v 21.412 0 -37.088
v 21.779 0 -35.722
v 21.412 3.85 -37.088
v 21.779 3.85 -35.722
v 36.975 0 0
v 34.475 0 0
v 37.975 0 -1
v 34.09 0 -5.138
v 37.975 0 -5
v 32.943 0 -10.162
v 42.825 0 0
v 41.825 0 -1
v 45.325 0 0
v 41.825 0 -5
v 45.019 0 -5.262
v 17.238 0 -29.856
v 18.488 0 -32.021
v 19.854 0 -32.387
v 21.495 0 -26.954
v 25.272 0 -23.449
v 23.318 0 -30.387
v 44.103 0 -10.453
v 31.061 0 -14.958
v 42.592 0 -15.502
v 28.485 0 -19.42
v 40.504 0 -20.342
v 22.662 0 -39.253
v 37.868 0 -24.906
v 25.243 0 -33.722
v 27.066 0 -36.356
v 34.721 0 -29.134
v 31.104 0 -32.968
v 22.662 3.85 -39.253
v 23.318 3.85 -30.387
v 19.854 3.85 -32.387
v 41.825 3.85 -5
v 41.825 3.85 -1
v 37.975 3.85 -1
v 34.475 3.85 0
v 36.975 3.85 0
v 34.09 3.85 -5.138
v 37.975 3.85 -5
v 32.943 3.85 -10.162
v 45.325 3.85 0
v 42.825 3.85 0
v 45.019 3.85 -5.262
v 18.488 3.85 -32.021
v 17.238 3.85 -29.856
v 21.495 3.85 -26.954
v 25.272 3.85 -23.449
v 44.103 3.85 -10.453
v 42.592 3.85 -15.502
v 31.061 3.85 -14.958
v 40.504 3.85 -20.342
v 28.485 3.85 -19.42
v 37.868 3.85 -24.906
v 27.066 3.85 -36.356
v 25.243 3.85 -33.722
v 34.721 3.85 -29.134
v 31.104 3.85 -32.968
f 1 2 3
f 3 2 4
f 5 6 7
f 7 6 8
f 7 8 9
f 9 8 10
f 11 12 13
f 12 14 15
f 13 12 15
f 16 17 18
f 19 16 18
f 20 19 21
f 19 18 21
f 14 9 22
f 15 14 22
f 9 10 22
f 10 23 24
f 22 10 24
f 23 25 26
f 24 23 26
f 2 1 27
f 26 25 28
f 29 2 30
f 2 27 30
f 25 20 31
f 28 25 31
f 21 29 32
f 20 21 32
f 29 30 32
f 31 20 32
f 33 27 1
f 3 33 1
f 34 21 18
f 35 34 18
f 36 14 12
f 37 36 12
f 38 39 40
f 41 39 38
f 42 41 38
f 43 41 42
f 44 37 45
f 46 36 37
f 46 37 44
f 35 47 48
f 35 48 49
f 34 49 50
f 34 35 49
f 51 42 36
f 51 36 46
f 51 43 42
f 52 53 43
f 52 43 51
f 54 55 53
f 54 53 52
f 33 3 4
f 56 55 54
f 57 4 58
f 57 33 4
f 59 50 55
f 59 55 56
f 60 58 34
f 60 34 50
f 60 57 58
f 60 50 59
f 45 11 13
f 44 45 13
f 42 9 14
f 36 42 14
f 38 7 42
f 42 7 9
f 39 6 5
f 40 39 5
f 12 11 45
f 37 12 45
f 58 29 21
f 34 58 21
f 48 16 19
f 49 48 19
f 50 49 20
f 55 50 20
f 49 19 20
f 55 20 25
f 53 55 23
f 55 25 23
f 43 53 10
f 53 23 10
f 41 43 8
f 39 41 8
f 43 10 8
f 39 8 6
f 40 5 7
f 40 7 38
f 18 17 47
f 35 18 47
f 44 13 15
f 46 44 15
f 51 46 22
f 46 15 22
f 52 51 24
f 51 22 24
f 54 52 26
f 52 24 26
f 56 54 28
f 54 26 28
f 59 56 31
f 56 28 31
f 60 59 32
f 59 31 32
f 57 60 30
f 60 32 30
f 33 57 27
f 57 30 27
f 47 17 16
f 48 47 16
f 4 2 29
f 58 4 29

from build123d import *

# Parameters (mm, degrees)
BOSS_EXTRUDE1_DEPTH = 3.85
CHAMFER1_SIZE       = 1


with BuildPart() as part:
    # Sketch1 → Boss-Extrude1 (new body)
    with BuildSketch(Plane(origin=(0, 0, 0), x_dir=(1, 0, 0), z_dir=(0, 1, 0))):
        with BuildLine():
            Line((37.975, 0), (37.975, 5))
            Line((37.975, 5), (41.825, 5))
            Line((41.825, 5), (41.825, 0))
            Line((41.825, 0), (45.325, 0))
            ThreePointArc((45.325, 0), (39.252601427, 22.6625), (22.6625, 39.252601427))
            Line((22.6625, 39.252601427), (20.9125, 36.221512513))
            Line((20.9125, 36.221512513), (25.242627019, 33.721512513))
            Line((25.242627019, 33.721512513), (23.317627019, 30.387314709))
            Line((23.317627019, 30.387314709), (18.9875, 32.887314709))
            Line((18.9875, 32.887314709), (17.2375, 29.856225795))
            ThreePointArc((17.2375, 29.856225795), (29.856225795, 17.2375), (34.475, 0))
            Line((34.475, 0), (37.975, 0))
        make_face()
    extrude(amount=BOSS_EXTRUDE1_DEPTH)

    # Chamfer1
    chamfer1_edges = [part.edges().sort_by_distance(p)[0] for p in [
        (18.9875, 1.925, -32.887314709),
        (20.9125, 1.925, -36.221512513),
        (41.825, 1.925, 0),
        (37.975, 1.925, 0),
    ]]
    chamfer(chamfer1_edges, length=CHAMFER1_SIZE)


solid = part.part
